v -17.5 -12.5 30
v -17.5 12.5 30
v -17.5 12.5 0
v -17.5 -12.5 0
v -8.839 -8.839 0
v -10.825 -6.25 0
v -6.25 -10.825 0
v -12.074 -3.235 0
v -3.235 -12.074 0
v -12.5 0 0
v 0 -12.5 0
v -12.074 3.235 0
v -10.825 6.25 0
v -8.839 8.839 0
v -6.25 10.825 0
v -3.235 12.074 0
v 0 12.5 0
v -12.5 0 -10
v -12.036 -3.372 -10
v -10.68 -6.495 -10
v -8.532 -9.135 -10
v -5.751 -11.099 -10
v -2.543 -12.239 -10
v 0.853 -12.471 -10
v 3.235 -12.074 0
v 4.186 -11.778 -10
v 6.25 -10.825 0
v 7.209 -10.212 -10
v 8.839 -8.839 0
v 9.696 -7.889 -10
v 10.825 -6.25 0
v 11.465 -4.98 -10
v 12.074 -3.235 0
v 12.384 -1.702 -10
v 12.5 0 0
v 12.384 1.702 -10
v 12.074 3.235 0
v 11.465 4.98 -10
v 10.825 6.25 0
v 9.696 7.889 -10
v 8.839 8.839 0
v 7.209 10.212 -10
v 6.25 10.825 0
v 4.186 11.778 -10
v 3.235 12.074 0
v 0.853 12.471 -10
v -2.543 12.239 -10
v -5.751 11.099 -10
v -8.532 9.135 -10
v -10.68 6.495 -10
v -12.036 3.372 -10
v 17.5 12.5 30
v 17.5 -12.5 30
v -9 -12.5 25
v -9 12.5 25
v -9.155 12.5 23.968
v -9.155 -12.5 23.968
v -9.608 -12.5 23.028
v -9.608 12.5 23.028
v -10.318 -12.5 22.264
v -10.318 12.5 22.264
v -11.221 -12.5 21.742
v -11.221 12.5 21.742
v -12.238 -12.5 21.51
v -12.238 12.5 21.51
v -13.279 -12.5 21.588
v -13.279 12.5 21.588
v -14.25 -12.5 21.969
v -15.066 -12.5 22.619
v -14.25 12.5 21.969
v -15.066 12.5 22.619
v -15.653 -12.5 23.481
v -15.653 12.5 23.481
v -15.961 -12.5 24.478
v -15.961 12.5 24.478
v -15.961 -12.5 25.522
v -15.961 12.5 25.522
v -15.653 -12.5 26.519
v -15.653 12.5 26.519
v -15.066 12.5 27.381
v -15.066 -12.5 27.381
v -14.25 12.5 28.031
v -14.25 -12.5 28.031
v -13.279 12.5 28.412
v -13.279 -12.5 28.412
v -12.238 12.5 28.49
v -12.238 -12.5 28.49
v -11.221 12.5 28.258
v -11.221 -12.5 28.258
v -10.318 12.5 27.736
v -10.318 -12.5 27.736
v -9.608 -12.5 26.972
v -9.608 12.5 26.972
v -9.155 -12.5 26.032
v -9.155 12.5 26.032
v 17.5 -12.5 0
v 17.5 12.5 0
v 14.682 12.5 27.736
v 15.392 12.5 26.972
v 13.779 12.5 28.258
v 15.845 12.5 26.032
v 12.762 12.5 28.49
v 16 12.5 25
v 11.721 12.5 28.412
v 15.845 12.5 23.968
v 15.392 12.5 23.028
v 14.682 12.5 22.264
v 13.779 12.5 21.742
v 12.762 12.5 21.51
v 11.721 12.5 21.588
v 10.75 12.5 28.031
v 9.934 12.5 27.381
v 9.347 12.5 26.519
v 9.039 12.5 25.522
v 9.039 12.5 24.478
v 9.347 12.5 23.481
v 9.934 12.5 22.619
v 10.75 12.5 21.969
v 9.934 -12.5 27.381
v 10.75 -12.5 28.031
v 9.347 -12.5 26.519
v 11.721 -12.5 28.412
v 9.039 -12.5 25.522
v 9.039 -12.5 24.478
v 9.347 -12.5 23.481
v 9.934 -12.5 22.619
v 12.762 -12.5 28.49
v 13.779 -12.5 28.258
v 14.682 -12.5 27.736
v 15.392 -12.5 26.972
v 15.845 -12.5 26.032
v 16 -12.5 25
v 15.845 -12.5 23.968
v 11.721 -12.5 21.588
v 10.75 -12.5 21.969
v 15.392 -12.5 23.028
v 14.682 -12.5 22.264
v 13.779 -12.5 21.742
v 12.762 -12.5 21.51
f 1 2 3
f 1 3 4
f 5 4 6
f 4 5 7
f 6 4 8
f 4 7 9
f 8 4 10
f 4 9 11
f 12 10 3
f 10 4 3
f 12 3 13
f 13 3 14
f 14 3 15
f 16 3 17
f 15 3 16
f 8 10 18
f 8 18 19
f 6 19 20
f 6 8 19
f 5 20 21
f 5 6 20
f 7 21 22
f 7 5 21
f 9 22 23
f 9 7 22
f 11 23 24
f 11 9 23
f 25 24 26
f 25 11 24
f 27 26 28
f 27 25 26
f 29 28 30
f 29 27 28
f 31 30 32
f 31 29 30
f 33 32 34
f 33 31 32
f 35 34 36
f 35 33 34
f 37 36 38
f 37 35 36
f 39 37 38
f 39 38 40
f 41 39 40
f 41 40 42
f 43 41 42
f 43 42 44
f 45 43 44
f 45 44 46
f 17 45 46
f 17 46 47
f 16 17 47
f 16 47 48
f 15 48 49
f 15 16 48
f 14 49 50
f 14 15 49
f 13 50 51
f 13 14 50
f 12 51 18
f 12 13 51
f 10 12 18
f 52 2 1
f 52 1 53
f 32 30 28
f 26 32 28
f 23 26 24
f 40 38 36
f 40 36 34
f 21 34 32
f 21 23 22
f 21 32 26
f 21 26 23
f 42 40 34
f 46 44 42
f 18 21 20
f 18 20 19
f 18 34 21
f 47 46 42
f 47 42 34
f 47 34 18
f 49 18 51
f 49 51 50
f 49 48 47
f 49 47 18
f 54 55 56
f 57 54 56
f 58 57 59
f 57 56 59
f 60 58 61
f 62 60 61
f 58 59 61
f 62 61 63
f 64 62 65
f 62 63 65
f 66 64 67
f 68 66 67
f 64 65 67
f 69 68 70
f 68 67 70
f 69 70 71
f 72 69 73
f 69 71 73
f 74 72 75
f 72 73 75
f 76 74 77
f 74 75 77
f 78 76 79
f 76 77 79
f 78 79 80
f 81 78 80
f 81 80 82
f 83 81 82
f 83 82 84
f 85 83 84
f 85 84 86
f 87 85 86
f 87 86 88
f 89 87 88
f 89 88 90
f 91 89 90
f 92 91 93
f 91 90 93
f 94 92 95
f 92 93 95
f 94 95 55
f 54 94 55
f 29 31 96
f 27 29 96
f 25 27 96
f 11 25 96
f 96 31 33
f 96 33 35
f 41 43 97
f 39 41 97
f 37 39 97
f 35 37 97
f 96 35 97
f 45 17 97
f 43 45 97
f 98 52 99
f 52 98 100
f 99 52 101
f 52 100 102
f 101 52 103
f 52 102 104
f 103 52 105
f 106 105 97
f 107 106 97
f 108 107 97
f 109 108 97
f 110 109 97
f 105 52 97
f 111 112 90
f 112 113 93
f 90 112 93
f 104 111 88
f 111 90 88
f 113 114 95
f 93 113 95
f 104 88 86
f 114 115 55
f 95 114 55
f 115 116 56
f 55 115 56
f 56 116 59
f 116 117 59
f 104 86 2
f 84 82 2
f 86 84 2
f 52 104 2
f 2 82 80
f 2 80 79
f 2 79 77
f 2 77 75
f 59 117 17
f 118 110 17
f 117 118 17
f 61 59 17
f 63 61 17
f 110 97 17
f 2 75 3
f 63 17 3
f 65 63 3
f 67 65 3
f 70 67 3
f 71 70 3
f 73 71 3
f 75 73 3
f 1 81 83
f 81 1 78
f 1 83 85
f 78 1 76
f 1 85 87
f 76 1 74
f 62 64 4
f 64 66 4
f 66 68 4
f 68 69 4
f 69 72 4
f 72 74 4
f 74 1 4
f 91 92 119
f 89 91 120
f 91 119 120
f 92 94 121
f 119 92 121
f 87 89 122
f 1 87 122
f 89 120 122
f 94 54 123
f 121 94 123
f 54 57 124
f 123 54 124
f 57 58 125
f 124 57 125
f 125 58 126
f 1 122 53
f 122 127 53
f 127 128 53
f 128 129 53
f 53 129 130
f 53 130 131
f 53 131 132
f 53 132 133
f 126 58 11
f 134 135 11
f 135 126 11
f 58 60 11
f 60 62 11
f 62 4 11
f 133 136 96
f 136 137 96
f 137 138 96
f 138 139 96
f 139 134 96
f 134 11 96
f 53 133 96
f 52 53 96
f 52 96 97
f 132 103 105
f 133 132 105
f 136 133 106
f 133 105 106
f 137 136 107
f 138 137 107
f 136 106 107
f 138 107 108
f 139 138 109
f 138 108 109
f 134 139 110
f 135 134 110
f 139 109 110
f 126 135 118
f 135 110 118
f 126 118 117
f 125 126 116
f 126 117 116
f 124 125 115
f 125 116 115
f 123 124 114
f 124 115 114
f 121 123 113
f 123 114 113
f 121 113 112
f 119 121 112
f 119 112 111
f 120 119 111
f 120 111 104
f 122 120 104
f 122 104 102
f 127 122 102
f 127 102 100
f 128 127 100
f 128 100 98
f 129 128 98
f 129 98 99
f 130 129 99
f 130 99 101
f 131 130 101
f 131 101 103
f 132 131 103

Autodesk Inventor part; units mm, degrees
ref_plane "YZ Plane" through (0, 0, 0) normal (1, 0, 0) x (0, 1, 0)
ref_plane "XZ Plane" through (0, 0, 0) normal (0, 1, 0) x (-1, 0, 0)
ref_plane "XY Plane" through (0, 0, 0) normal (0, 0, 1) x (1, 0, 0)
sketch "Sketch1" plane through (0, 0, 0) normal (0, 0, 1) x (1, 0, 0)
  line L0 (-17.5, -12.5) -> (17.5, -12.5)
  line L1 (17.5, -12.5) -> (17.5, 12.5)
  line L2 (17.5, 12.5) -> (-17.5, 12.5)
  line L3 (-17.5, 12.5) -> (-17.5, -12.5)
  line L4 (-17.5, -12.5) -> (17.5, 12.5) construction
  line L5 (17.5, -12.5) -> (-17.5, 12.5) construction
  point P0 (0, 0)
  dimension "d0" = 35
  dimension "d1" = 25
extrude "Extrusion1" add sketch "Sketch1" along normal blind 30
sketch "Sketch2" plane through (0, 0, 0) normal (0, 0, -1) x (-1, 0, 0)
  circle A0 centre (0, 0) radius 12.5
  dimension "d4" = 25
extrude "Extrusion2" add sketch "Sketch2" along normal blind 10
sketch "Sketch3" plane through (-17.5, 12.5, 30) normal (0, 1, 0) x (1, 0, 0)
  circle A0 centre (30, 5) radius 3.5
  circle A1 centre (5, 5) radius 3.5
  line L0 (35, 0) -> (0, 0) projected
  line L1 (0, 30) -> (0, 0) projected
  line L2 (35, 30) -> (35, 0) projected
  point P0 (17.5, 30)
  dimension "d7" = 7
  dimension "d8" = 7
  dimension "d9" = 5
  dimension "d10" = 5
  dimension "d11" = 5
  dimension "d12" = 5
extrude "Extrusion3" cut sketch "Sketch3" against normal through all
